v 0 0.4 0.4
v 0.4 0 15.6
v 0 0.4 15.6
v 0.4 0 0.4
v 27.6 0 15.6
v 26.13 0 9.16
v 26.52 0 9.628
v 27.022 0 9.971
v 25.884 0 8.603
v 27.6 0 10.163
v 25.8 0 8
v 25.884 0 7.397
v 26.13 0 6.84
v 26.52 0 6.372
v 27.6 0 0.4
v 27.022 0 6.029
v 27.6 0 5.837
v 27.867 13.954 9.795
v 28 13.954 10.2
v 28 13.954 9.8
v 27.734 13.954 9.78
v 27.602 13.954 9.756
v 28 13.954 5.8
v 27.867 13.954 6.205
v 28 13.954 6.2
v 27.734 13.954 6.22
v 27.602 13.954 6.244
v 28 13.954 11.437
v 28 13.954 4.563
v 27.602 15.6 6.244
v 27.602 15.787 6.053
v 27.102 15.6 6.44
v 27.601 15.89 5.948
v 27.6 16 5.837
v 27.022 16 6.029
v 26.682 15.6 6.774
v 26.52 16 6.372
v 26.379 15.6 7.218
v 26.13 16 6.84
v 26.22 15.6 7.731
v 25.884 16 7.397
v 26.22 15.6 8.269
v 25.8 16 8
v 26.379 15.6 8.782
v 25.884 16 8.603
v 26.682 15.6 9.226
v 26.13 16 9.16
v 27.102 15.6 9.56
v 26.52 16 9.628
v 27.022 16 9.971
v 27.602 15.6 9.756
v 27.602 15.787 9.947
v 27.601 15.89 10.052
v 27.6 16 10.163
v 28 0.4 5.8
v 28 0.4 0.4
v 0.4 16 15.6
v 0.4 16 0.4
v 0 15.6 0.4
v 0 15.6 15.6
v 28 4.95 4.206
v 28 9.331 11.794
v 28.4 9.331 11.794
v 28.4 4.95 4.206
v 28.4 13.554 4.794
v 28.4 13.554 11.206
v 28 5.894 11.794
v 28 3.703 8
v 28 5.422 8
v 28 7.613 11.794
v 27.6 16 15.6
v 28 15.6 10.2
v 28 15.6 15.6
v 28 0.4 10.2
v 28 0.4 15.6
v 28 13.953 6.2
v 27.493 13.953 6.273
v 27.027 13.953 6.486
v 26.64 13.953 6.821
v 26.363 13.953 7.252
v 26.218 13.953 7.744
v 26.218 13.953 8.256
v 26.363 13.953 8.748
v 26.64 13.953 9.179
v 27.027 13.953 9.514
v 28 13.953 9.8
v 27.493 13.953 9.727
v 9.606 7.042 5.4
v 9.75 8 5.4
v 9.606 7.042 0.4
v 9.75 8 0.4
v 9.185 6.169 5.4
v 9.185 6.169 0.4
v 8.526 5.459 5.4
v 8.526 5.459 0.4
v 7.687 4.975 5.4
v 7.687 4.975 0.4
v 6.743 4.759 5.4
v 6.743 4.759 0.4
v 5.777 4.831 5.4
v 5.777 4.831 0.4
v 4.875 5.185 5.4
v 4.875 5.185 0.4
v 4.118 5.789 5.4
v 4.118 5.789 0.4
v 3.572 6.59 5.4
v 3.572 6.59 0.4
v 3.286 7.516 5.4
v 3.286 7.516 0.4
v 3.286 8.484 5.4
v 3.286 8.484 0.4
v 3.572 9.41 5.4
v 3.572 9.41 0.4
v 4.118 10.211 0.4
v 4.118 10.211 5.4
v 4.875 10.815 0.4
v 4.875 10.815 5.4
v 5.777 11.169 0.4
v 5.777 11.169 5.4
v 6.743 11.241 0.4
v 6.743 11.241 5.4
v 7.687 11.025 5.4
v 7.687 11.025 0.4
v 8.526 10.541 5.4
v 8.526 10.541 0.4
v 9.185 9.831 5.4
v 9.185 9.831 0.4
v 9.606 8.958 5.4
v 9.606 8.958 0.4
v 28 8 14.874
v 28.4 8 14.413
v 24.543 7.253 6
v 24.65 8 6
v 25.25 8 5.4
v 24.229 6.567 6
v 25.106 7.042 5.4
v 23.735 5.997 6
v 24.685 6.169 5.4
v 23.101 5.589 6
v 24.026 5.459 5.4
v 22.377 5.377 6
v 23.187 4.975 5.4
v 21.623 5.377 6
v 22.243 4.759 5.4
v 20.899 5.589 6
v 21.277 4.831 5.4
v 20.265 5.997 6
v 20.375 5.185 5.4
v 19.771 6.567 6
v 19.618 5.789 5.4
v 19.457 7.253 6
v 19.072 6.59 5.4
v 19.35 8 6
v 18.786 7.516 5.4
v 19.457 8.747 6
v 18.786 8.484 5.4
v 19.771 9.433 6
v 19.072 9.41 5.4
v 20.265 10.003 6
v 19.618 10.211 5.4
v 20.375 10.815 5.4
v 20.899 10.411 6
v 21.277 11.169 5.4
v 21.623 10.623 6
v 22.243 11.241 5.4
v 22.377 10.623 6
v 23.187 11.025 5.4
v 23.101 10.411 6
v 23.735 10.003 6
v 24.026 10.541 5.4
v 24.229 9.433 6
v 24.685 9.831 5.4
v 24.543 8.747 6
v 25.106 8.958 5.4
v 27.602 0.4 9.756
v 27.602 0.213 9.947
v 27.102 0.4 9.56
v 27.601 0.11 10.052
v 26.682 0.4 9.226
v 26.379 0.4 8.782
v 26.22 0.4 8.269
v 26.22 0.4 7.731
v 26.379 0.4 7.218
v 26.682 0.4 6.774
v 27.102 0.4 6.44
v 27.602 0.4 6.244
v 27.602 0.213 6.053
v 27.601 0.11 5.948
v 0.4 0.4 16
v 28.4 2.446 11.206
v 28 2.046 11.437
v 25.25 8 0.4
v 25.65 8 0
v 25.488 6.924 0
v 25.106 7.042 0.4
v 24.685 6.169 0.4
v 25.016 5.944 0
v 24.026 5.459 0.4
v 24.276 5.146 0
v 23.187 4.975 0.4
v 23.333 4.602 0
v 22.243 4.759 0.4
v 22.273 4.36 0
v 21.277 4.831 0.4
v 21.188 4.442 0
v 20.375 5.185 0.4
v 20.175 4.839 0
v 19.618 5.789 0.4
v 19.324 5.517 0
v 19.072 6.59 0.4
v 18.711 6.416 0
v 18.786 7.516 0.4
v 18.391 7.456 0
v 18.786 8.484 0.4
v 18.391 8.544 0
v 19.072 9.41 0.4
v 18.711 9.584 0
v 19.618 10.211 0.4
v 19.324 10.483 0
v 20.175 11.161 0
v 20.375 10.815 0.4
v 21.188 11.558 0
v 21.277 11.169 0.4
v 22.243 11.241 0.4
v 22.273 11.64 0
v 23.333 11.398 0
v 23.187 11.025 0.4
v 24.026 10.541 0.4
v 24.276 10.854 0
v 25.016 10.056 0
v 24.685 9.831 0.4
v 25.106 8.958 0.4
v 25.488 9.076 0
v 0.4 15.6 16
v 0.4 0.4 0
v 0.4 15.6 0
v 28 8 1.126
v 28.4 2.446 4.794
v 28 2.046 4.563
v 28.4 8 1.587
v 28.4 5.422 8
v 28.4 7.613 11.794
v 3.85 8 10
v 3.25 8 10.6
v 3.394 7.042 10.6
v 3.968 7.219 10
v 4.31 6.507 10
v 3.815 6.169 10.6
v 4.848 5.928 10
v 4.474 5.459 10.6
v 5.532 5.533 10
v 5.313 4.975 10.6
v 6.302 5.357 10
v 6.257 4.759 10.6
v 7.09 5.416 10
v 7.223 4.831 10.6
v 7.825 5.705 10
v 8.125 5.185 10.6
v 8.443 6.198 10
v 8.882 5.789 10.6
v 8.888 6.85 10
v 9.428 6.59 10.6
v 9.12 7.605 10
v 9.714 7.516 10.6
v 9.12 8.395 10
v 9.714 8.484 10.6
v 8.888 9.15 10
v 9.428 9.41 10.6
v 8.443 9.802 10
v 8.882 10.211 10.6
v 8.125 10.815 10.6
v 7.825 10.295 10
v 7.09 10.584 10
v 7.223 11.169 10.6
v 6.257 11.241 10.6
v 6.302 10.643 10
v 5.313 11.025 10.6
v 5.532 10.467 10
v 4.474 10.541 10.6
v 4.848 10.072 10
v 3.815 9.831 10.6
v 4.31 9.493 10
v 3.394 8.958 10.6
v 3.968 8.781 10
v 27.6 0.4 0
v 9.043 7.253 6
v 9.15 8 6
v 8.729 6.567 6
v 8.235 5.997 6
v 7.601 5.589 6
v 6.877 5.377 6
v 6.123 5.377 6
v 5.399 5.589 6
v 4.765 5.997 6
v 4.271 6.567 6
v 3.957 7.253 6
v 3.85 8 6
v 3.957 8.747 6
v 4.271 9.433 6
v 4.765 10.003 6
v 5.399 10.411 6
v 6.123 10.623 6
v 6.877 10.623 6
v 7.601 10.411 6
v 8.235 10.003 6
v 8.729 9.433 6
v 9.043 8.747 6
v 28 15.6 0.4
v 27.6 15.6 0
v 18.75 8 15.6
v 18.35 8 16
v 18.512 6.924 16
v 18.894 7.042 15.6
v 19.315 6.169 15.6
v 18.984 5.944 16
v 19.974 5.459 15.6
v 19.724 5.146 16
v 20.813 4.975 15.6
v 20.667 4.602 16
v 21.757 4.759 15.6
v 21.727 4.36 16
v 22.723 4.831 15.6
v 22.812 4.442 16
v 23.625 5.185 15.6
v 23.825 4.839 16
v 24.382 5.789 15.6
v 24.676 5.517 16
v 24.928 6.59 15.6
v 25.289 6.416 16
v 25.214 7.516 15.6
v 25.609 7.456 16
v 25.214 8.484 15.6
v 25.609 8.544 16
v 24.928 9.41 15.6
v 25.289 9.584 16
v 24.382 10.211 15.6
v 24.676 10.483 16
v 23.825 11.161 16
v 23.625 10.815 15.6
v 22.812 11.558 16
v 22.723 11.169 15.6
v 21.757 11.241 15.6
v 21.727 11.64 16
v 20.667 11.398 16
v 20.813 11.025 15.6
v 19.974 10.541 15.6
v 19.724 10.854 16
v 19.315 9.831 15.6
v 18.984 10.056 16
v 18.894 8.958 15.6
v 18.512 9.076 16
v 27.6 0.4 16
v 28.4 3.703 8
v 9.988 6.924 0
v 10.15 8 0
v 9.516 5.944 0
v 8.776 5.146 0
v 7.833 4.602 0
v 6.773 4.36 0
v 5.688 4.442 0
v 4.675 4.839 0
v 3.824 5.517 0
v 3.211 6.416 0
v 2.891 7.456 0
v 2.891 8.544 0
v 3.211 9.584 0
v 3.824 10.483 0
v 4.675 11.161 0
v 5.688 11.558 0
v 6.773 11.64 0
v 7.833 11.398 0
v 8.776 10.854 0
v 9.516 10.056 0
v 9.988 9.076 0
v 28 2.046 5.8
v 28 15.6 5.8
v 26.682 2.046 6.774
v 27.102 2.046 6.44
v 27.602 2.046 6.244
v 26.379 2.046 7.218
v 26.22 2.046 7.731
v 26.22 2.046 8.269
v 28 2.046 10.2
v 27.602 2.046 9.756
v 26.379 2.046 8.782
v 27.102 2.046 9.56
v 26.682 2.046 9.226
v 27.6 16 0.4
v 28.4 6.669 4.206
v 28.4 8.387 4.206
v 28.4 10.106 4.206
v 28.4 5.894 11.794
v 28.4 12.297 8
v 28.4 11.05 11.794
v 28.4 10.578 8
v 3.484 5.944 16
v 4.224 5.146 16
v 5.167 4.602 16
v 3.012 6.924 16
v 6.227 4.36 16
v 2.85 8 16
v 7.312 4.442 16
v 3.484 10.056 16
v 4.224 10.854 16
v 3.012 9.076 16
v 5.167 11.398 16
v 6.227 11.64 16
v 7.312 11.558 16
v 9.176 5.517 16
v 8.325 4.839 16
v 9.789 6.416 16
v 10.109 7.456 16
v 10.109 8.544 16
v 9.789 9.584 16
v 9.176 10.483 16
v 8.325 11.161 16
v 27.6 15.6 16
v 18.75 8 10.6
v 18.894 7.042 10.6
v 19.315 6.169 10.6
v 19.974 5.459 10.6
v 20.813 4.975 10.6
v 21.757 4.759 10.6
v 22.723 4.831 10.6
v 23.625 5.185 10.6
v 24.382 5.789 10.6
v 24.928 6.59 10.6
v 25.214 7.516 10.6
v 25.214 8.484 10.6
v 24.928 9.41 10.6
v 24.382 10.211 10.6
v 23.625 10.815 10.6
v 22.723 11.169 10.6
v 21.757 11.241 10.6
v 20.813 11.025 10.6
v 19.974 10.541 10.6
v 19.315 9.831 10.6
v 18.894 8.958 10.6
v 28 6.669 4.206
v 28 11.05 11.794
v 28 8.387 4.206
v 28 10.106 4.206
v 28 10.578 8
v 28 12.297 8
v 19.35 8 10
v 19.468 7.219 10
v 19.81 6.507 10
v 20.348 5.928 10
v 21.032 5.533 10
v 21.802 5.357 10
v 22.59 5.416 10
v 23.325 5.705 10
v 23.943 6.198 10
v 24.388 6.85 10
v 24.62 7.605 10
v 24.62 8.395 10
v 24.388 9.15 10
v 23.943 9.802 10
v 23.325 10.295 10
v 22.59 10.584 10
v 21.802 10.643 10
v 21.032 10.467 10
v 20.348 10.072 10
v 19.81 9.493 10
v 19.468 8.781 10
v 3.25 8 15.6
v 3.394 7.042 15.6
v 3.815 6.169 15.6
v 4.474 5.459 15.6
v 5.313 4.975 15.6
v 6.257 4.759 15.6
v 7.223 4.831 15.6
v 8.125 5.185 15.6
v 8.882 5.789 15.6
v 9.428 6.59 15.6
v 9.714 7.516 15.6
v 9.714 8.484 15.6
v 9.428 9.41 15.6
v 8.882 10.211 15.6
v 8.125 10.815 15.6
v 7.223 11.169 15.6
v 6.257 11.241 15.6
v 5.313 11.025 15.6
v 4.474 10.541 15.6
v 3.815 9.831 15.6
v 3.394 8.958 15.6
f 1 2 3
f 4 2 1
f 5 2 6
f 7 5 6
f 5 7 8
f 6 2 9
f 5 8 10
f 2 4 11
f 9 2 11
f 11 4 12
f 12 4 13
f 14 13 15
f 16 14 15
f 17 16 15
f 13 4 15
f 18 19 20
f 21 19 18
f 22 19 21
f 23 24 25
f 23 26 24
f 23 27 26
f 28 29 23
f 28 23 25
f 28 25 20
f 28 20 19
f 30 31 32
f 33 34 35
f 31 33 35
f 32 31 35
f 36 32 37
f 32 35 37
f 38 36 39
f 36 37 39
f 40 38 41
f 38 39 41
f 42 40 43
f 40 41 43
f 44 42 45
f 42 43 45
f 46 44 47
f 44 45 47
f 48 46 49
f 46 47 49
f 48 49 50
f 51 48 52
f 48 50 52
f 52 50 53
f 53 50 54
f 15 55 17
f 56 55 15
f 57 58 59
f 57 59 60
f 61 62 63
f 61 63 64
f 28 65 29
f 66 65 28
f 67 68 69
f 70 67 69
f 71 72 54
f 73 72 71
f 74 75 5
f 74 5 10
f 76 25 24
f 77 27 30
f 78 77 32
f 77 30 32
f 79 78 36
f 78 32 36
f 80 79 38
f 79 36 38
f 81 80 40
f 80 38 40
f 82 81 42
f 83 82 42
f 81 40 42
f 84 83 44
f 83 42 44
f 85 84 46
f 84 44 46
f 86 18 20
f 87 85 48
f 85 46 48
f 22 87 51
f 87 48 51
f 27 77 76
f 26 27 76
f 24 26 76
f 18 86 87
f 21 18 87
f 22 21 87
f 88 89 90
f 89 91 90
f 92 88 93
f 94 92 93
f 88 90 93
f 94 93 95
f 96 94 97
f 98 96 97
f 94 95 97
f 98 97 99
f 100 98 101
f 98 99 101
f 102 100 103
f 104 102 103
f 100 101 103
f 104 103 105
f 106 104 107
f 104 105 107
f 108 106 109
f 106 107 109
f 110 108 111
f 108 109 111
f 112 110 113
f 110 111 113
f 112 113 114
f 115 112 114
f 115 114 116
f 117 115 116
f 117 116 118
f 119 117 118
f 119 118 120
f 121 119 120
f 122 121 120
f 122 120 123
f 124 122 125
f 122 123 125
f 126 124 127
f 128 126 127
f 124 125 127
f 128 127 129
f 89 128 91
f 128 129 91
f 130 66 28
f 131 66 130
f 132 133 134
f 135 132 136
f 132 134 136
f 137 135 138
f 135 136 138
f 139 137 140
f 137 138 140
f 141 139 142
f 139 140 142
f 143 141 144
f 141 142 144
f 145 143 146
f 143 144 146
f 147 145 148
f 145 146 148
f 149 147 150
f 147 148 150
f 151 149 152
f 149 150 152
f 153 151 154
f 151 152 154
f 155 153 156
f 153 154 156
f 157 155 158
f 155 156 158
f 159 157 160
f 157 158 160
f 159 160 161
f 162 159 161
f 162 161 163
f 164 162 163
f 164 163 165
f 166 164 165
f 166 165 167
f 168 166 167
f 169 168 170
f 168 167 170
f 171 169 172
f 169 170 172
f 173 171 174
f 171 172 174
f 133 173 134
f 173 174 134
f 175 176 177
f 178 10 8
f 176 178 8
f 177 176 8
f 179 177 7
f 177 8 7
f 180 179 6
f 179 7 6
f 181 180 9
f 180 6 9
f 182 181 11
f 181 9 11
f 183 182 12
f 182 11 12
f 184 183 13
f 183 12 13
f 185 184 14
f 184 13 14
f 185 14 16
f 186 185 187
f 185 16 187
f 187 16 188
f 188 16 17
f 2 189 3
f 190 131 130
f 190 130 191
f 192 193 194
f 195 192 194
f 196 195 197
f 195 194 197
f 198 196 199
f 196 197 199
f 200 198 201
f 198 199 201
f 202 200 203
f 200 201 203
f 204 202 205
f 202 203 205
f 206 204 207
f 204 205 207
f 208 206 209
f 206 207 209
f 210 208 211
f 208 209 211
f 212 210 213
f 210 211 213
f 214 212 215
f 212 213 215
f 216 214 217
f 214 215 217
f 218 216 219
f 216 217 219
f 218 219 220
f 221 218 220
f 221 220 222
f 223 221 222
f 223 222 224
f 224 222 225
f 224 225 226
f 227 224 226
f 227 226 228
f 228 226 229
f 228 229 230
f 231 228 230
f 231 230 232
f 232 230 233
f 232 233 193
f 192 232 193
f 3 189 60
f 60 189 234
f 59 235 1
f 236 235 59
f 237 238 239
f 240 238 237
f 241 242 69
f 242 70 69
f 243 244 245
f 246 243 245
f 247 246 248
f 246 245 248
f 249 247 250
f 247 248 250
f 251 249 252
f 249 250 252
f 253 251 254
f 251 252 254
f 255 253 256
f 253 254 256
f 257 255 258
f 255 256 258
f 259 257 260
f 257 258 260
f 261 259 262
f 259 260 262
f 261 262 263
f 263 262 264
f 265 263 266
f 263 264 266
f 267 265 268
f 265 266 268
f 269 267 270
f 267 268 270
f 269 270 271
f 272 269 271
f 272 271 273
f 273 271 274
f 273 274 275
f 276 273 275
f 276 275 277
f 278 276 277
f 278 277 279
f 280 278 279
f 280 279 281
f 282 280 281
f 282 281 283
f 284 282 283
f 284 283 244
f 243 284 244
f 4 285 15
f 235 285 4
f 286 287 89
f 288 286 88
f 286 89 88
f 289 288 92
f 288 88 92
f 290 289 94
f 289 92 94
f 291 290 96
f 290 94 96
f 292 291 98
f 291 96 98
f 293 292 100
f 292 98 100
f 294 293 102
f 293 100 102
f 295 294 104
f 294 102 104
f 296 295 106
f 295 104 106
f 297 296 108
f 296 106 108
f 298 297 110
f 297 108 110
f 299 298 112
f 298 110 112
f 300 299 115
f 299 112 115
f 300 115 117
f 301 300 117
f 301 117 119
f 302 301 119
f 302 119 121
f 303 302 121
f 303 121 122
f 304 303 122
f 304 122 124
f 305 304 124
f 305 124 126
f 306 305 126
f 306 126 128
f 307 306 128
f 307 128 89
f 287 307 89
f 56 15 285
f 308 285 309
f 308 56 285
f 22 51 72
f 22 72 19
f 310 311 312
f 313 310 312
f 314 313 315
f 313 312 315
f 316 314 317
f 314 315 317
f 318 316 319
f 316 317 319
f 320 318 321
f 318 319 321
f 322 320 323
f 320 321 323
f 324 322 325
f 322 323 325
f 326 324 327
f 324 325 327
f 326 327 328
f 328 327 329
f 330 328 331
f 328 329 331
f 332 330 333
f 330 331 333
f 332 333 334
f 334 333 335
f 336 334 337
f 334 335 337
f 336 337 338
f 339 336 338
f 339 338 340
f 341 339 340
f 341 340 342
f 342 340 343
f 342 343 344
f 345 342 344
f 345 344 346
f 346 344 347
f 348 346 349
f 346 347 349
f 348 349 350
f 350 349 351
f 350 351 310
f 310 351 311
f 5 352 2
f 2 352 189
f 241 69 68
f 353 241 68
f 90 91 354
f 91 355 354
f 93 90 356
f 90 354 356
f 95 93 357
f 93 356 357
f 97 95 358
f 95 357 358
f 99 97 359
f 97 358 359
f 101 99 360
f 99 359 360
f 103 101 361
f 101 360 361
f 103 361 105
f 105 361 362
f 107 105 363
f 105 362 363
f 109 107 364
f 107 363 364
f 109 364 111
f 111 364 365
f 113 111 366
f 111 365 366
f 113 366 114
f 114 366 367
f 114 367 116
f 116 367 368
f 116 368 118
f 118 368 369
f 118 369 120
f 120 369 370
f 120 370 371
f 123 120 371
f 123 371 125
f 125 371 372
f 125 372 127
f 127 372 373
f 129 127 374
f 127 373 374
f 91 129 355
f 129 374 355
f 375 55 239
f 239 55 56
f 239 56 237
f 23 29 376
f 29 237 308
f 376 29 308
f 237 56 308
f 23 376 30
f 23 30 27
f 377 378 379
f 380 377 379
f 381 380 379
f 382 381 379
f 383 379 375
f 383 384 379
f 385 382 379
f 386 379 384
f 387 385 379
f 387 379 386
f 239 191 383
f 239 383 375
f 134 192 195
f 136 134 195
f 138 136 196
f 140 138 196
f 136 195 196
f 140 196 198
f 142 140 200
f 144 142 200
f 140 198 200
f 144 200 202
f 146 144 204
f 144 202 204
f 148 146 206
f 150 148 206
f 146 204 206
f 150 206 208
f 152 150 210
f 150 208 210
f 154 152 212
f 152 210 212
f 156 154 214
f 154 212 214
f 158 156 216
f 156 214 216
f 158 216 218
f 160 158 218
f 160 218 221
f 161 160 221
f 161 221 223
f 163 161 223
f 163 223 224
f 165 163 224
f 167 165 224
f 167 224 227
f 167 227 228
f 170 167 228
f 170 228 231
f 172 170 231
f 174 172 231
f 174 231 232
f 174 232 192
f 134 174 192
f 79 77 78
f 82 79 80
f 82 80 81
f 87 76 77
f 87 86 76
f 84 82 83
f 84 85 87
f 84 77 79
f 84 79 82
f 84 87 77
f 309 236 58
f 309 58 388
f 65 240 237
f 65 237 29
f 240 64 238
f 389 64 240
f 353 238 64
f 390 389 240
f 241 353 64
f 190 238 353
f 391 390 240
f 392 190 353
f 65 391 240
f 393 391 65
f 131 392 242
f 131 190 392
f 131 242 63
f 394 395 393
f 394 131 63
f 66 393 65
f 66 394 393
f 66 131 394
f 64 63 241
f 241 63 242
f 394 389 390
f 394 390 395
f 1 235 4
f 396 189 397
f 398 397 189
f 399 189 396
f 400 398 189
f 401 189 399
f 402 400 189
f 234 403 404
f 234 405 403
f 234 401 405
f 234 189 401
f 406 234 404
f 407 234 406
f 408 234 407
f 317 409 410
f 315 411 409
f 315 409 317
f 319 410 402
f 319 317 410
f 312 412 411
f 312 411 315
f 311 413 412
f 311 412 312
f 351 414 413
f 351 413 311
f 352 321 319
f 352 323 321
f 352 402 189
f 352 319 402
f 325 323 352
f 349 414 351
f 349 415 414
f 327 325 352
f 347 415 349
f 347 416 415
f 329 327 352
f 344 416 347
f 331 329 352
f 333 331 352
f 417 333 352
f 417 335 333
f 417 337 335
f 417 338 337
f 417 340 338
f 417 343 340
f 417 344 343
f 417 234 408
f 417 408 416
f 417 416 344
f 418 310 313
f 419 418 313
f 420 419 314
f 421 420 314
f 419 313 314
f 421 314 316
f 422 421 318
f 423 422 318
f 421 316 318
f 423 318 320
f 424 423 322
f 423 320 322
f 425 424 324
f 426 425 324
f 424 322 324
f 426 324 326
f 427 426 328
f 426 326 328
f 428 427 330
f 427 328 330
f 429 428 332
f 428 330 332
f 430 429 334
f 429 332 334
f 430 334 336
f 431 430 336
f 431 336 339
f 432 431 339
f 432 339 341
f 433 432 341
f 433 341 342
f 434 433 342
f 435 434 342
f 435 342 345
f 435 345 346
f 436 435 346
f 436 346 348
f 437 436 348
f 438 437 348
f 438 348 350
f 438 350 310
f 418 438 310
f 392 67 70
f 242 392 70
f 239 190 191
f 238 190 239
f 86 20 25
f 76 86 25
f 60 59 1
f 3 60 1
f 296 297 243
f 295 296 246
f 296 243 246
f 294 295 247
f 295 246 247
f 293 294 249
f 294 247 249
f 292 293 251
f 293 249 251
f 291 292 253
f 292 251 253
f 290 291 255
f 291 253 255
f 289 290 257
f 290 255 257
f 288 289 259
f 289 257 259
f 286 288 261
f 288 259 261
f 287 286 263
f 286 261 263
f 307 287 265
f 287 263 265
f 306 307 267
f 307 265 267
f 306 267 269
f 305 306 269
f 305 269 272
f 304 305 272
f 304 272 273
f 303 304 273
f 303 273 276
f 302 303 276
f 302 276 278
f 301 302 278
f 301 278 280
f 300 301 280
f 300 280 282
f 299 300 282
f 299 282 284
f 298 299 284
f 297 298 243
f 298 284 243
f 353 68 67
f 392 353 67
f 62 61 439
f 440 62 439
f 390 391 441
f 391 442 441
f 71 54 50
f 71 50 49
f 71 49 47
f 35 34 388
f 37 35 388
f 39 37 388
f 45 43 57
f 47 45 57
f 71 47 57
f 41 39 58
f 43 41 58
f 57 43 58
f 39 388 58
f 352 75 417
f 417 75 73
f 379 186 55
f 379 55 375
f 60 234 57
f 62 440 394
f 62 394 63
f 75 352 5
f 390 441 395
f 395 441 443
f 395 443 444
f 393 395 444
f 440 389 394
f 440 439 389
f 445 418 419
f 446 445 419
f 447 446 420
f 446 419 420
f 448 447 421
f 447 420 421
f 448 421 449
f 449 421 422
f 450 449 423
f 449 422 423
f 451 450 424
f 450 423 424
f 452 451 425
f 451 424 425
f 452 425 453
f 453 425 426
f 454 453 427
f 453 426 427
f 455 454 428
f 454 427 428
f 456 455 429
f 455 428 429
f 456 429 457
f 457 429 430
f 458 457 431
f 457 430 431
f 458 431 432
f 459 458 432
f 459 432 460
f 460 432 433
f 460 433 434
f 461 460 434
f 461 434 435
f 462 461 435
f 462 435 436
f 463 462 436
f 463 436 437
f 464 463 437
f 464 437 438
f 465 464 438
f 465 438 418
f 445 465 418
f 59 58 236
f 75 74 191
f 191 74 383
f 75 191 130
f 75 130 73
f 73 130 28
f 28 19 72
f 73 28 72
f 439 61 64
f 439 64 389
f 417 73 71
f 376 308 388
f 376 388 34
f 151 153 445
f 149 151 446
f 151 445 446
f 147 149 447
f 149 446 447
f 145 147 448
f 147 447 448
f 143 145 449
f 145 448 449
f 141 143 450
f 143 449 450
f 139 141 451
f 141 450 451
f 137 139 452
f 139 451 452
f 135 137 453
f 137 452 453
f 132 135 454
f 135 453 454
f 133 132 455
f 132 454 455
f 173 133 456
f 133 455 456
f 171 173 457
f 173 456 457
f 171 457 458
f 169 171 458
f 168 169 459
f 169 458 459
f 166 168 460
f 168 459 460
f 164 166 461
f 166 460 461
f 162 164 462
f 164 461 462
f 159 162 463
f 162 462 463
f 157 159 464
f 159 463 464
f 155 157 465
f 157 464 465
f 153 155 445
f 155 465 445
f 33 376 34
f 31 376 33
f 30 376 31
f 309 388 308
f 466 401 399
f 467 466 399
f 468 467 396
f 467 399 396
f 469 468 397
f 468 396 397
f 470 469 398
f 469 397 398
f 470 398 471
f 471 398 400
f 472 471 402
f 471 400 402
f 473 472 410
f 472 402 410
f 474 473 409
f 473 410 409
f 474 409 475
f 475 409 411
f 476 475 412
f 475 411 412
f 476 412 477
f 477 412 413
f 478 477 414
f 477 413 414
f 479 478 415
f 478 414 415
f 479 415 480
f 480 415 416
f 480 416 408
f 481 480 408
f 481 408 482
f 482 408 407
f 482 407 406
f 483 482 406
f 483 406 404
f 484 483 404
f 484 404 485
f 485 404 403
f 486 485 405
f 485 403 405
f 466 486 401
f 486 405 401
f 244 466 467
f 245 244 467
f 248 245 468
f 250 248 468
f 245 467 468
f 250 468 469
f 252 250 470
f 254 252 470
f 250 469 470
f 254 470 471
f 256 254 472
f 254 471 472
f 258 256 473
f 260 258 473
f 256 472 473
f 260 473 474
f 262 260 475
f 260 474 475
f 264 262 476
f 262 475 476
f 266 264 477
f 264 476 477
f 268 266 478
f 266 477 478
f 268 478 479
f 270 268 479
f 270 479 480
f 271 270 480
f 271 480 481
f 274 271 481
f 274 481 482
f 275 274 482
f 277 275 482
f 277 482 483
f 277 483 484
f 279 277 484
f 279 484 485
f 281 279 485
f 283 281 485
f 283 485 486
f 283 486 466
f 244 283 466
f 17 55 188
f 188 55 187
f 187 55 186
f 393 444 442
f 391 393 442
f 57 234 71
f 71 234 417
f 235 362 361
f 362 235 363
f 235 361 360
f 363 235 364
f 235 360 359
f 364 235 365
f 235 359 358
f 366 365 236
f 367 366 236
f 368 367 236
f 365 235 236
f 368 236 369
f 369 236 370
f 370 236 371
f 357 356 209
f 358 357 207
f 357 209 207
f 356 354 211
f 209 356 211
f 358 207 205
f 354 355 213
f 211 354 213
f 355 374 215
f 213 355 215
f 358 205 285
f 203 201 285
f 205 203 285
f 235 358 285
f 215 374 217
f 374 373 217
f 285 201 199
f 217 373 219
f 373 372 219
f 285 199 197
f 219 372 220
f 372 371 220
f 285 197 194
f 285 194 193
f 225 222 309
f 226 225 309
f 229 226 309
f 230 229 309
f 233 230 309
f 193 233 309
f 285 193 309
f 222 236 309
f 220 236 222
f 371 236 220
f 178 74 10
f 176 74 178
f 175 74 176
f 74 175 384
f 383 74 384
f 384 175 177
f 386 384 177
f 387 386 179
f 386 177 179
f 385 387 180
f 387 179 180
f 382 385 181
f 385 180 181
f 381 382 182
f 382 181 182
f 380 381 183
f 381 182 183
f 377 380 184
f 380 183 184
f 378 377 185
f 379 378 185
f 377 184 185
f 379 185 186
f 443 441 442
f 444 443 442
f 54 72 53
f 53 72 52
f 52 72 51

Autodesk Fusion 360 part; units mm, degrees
sketch "Sketch1" plane through (0, 0, 0) normal (0, 0, 1) x (1, 0, 0)
  line L0 (0, 0) -> (28, 0)
  line L1 (28, 0) -> (28, 16)
  line L2 (28, 16) -> (0, 16)
  line L3 (0, 16) -> (0, 0)
  dimension "d1" = 28
  dimension "d2" = 16
extrude "Extrude1" add sketch "Sketch1" along normal blind 16
sketch "Sketch2" plane through (0, 0, 16) normal (0, 0, 1) x (-1, 0, 0)
  line L0 (0, -16) -> (0, 0)
  line L1 (0, 0) -> (-28, 0)
  line L2 (-28, 0) -> (-28, -16)
  line L3 (-28, -16) -> (0, -16)
  line L4 (0, -8) -> (-28, -8) construction
  line L5 (-6.5, -16) -> (-6.5, 0) construction
  line L6 (-22, -16) -> (-22, 0) construction
  circle A0 centre (-6.5, -8) radius 3.25
  circle A1 centre (-22, -8) radius 3.25
  dimension "d5" = 6.5
  dimension "d6" = 15.5
  dimension "d7" = 6.5
  dimension "d8" = 6.5
extrude "Extrude2" cut sketch "Sketch2" against normal blind 6 contours A0 | A1
sketch "Sketch3" plane through (0, 0, 0) normal (0, 0, -1) x (1, 0, 0)
  line L0 (0, 0) -> (0, -16)
  line L1 (0, -16) -> (28, -16)
  line L2 (28, -16) -> (28, 0)
  line L3 (28, 0) -> (0, 0)
  circle A0 centre (6.5, -8) radius 3.25
  circle A1 centre (22, -8) radius 3.25
extrude "Extrude3" cut sketch "Sketch3" against normal blind 6 contours A0 | A1
sketch "Sketch4" plane through (28, 0, 0) normal (1, 0, 0) x (0, 1, 0)
  line L0 (0, 0) -> (16, 0)
  line L1 (16, 0) -> (16, 16)
  line L2 (16, 16) -> (0, 16)
  line L3 (0, 16) -> (0, 0)
  line L4 (7.6128, 11.7945) -> (5.4221, 8)
  line L5 (12.2966, 8) -> (10.1058, 4.2055)
  line L6 (2.0465, 11.4373) -> (8, 14.8745)
  line L7 (5.8942, 11.7945) -> (7.6128, 11.7945)
  line L8 (3.7034, 8) -> (5.8942, 11.7945)
  line L9 (9.3314, 11.7945) -> (4.95, 4.2055)
  line L10 (13.9535, 11.4373) -> (13.9535, 4.5627)
  line L11 (6.6686, 4.2055) -> (11.05, 11.7945)
  line L12 (10.5779, 8) -> (12.2966, 8)
  line L13 (8, 14.8745) -> (13.9535, 11.4373)
  line L14 (8, 1.1255) -> (2.0465, 4.5627)
  line L15 (2.0465, 4.5627) -> (2.0465, 11.4373)
  line L16 (8.3872, 4.2055) -> (10.5779, 8)
  line L17 (5.4221, 8) -> (3.7034, 8)
  line L18 (4.95, 4.2055) -> (6.6686, 4.2055)
  line L19 (11.05, 11.7945) -> (9.3314, 11.7945)
  line L20 (10.1058, 4.2055) -> (8.3872, 4.2055)
  line L21 (13.9535, 4.5627) -> (8, 1.1255)
  line L22 (7.0257, 8) -> (8.9743, 8) construction
  line L23 (0, 8) -> (16, 8) construction
  line L24 (8, 16) -> (8, 0) construction
  point P0 (8, 8)
  point P1 (8, 8)
extrude "Extrude4" add sketch "Sketch4" along normal blind 0.4 contours L6 L10 L13 L14 L15 L21
sketch "Sketch5" plane through (0, 0, 0) normal (0, -1, 0) x (1, 0, 0)
  line L0 (0, 0) -> (28, 0)
  line L1 (28, 0) -> (28, 16)
  line L2 (28, 16) -> (0, 16)
  line L3 (0, 16) -> (0, 0)
  arc A0 (28, 9.8) -> (28, 6.2) centre (28, 8) ccw
  dimension "d25" = 1.8
sketch "Sketch6" plane through (0, 16, 0) normal (0, 1, 0) x (-1, 0, 0)
  line L0 (-28, 0) -> (0, 0)
  line L1 (0, 0) -> (0, 16)
  line L2 (0, 16) -> (-28, 16)
  line L3 (-28, 16) -> (-28, 0)
  arc A0 (-28, 6.2) -> (-28, 9.8) centre (-28, 8) ccw
extrude "Extrude8" cut sketch "Sketch5" against normal blind 2.0465 contours L1 A0
extrude "Extrude9" cut sketch "Sketch6" against normal blind 2.047 contours L3 A0
chamfer "Chamfer1" distance 0.4 angle 45 20 edges at (14, 0, 16) (28, 8, 16) (28, 0, 3.1) (28, 0, 12.9) (28, 16, 3.1) (28, 16, 12.9) (14, 16, 16) (0, 8, 16) (0, 16, 8) (14, 16, 0) (14, 0, 0) (0, 8, 0) (0, 0, 8) (28, 8, 0) (26.2, 0, 8) (28, 1.0232, 6.2) (28, 1.0232, 9.8) (26.2, 16, 8) (28, 14.9768, 6.2) (28, 14.9768, 9.8)
chamfer "Chamfer2" distance 0.4 angle 45 6 edges at (28.4, 5.0233, 13.1559) (28.4, 10.9768, 13.1559) (28.4, 2.0465, 8) (28.4, 5.0232, 2.8441) (28.4, 10.9768, 2.8441) (28.4, 13.9535, 8)
chamfer "Chamfer3" distance 0.4 angle 45 4 edges at (9.5301, 6.8247, 16) (25.0301, 6.8247, 16) (3.4699, 6.8247, 0) (18.9699, 6.8247, 0)
chamfer "Chamfer4" distance 0.6 angle 45 4 edges at (25.0301, 6.8247, 10) (9.5301, 6.8247, 10) (18.9699, 6.8247, 6) (3.4699, 6.8247, 6)
extrude "Extrude7" cut 2 faces at (7.0507, 8.6906, 10) (23.3948, 7.2286, 10) along direction (0, 0, -1) blind 4
